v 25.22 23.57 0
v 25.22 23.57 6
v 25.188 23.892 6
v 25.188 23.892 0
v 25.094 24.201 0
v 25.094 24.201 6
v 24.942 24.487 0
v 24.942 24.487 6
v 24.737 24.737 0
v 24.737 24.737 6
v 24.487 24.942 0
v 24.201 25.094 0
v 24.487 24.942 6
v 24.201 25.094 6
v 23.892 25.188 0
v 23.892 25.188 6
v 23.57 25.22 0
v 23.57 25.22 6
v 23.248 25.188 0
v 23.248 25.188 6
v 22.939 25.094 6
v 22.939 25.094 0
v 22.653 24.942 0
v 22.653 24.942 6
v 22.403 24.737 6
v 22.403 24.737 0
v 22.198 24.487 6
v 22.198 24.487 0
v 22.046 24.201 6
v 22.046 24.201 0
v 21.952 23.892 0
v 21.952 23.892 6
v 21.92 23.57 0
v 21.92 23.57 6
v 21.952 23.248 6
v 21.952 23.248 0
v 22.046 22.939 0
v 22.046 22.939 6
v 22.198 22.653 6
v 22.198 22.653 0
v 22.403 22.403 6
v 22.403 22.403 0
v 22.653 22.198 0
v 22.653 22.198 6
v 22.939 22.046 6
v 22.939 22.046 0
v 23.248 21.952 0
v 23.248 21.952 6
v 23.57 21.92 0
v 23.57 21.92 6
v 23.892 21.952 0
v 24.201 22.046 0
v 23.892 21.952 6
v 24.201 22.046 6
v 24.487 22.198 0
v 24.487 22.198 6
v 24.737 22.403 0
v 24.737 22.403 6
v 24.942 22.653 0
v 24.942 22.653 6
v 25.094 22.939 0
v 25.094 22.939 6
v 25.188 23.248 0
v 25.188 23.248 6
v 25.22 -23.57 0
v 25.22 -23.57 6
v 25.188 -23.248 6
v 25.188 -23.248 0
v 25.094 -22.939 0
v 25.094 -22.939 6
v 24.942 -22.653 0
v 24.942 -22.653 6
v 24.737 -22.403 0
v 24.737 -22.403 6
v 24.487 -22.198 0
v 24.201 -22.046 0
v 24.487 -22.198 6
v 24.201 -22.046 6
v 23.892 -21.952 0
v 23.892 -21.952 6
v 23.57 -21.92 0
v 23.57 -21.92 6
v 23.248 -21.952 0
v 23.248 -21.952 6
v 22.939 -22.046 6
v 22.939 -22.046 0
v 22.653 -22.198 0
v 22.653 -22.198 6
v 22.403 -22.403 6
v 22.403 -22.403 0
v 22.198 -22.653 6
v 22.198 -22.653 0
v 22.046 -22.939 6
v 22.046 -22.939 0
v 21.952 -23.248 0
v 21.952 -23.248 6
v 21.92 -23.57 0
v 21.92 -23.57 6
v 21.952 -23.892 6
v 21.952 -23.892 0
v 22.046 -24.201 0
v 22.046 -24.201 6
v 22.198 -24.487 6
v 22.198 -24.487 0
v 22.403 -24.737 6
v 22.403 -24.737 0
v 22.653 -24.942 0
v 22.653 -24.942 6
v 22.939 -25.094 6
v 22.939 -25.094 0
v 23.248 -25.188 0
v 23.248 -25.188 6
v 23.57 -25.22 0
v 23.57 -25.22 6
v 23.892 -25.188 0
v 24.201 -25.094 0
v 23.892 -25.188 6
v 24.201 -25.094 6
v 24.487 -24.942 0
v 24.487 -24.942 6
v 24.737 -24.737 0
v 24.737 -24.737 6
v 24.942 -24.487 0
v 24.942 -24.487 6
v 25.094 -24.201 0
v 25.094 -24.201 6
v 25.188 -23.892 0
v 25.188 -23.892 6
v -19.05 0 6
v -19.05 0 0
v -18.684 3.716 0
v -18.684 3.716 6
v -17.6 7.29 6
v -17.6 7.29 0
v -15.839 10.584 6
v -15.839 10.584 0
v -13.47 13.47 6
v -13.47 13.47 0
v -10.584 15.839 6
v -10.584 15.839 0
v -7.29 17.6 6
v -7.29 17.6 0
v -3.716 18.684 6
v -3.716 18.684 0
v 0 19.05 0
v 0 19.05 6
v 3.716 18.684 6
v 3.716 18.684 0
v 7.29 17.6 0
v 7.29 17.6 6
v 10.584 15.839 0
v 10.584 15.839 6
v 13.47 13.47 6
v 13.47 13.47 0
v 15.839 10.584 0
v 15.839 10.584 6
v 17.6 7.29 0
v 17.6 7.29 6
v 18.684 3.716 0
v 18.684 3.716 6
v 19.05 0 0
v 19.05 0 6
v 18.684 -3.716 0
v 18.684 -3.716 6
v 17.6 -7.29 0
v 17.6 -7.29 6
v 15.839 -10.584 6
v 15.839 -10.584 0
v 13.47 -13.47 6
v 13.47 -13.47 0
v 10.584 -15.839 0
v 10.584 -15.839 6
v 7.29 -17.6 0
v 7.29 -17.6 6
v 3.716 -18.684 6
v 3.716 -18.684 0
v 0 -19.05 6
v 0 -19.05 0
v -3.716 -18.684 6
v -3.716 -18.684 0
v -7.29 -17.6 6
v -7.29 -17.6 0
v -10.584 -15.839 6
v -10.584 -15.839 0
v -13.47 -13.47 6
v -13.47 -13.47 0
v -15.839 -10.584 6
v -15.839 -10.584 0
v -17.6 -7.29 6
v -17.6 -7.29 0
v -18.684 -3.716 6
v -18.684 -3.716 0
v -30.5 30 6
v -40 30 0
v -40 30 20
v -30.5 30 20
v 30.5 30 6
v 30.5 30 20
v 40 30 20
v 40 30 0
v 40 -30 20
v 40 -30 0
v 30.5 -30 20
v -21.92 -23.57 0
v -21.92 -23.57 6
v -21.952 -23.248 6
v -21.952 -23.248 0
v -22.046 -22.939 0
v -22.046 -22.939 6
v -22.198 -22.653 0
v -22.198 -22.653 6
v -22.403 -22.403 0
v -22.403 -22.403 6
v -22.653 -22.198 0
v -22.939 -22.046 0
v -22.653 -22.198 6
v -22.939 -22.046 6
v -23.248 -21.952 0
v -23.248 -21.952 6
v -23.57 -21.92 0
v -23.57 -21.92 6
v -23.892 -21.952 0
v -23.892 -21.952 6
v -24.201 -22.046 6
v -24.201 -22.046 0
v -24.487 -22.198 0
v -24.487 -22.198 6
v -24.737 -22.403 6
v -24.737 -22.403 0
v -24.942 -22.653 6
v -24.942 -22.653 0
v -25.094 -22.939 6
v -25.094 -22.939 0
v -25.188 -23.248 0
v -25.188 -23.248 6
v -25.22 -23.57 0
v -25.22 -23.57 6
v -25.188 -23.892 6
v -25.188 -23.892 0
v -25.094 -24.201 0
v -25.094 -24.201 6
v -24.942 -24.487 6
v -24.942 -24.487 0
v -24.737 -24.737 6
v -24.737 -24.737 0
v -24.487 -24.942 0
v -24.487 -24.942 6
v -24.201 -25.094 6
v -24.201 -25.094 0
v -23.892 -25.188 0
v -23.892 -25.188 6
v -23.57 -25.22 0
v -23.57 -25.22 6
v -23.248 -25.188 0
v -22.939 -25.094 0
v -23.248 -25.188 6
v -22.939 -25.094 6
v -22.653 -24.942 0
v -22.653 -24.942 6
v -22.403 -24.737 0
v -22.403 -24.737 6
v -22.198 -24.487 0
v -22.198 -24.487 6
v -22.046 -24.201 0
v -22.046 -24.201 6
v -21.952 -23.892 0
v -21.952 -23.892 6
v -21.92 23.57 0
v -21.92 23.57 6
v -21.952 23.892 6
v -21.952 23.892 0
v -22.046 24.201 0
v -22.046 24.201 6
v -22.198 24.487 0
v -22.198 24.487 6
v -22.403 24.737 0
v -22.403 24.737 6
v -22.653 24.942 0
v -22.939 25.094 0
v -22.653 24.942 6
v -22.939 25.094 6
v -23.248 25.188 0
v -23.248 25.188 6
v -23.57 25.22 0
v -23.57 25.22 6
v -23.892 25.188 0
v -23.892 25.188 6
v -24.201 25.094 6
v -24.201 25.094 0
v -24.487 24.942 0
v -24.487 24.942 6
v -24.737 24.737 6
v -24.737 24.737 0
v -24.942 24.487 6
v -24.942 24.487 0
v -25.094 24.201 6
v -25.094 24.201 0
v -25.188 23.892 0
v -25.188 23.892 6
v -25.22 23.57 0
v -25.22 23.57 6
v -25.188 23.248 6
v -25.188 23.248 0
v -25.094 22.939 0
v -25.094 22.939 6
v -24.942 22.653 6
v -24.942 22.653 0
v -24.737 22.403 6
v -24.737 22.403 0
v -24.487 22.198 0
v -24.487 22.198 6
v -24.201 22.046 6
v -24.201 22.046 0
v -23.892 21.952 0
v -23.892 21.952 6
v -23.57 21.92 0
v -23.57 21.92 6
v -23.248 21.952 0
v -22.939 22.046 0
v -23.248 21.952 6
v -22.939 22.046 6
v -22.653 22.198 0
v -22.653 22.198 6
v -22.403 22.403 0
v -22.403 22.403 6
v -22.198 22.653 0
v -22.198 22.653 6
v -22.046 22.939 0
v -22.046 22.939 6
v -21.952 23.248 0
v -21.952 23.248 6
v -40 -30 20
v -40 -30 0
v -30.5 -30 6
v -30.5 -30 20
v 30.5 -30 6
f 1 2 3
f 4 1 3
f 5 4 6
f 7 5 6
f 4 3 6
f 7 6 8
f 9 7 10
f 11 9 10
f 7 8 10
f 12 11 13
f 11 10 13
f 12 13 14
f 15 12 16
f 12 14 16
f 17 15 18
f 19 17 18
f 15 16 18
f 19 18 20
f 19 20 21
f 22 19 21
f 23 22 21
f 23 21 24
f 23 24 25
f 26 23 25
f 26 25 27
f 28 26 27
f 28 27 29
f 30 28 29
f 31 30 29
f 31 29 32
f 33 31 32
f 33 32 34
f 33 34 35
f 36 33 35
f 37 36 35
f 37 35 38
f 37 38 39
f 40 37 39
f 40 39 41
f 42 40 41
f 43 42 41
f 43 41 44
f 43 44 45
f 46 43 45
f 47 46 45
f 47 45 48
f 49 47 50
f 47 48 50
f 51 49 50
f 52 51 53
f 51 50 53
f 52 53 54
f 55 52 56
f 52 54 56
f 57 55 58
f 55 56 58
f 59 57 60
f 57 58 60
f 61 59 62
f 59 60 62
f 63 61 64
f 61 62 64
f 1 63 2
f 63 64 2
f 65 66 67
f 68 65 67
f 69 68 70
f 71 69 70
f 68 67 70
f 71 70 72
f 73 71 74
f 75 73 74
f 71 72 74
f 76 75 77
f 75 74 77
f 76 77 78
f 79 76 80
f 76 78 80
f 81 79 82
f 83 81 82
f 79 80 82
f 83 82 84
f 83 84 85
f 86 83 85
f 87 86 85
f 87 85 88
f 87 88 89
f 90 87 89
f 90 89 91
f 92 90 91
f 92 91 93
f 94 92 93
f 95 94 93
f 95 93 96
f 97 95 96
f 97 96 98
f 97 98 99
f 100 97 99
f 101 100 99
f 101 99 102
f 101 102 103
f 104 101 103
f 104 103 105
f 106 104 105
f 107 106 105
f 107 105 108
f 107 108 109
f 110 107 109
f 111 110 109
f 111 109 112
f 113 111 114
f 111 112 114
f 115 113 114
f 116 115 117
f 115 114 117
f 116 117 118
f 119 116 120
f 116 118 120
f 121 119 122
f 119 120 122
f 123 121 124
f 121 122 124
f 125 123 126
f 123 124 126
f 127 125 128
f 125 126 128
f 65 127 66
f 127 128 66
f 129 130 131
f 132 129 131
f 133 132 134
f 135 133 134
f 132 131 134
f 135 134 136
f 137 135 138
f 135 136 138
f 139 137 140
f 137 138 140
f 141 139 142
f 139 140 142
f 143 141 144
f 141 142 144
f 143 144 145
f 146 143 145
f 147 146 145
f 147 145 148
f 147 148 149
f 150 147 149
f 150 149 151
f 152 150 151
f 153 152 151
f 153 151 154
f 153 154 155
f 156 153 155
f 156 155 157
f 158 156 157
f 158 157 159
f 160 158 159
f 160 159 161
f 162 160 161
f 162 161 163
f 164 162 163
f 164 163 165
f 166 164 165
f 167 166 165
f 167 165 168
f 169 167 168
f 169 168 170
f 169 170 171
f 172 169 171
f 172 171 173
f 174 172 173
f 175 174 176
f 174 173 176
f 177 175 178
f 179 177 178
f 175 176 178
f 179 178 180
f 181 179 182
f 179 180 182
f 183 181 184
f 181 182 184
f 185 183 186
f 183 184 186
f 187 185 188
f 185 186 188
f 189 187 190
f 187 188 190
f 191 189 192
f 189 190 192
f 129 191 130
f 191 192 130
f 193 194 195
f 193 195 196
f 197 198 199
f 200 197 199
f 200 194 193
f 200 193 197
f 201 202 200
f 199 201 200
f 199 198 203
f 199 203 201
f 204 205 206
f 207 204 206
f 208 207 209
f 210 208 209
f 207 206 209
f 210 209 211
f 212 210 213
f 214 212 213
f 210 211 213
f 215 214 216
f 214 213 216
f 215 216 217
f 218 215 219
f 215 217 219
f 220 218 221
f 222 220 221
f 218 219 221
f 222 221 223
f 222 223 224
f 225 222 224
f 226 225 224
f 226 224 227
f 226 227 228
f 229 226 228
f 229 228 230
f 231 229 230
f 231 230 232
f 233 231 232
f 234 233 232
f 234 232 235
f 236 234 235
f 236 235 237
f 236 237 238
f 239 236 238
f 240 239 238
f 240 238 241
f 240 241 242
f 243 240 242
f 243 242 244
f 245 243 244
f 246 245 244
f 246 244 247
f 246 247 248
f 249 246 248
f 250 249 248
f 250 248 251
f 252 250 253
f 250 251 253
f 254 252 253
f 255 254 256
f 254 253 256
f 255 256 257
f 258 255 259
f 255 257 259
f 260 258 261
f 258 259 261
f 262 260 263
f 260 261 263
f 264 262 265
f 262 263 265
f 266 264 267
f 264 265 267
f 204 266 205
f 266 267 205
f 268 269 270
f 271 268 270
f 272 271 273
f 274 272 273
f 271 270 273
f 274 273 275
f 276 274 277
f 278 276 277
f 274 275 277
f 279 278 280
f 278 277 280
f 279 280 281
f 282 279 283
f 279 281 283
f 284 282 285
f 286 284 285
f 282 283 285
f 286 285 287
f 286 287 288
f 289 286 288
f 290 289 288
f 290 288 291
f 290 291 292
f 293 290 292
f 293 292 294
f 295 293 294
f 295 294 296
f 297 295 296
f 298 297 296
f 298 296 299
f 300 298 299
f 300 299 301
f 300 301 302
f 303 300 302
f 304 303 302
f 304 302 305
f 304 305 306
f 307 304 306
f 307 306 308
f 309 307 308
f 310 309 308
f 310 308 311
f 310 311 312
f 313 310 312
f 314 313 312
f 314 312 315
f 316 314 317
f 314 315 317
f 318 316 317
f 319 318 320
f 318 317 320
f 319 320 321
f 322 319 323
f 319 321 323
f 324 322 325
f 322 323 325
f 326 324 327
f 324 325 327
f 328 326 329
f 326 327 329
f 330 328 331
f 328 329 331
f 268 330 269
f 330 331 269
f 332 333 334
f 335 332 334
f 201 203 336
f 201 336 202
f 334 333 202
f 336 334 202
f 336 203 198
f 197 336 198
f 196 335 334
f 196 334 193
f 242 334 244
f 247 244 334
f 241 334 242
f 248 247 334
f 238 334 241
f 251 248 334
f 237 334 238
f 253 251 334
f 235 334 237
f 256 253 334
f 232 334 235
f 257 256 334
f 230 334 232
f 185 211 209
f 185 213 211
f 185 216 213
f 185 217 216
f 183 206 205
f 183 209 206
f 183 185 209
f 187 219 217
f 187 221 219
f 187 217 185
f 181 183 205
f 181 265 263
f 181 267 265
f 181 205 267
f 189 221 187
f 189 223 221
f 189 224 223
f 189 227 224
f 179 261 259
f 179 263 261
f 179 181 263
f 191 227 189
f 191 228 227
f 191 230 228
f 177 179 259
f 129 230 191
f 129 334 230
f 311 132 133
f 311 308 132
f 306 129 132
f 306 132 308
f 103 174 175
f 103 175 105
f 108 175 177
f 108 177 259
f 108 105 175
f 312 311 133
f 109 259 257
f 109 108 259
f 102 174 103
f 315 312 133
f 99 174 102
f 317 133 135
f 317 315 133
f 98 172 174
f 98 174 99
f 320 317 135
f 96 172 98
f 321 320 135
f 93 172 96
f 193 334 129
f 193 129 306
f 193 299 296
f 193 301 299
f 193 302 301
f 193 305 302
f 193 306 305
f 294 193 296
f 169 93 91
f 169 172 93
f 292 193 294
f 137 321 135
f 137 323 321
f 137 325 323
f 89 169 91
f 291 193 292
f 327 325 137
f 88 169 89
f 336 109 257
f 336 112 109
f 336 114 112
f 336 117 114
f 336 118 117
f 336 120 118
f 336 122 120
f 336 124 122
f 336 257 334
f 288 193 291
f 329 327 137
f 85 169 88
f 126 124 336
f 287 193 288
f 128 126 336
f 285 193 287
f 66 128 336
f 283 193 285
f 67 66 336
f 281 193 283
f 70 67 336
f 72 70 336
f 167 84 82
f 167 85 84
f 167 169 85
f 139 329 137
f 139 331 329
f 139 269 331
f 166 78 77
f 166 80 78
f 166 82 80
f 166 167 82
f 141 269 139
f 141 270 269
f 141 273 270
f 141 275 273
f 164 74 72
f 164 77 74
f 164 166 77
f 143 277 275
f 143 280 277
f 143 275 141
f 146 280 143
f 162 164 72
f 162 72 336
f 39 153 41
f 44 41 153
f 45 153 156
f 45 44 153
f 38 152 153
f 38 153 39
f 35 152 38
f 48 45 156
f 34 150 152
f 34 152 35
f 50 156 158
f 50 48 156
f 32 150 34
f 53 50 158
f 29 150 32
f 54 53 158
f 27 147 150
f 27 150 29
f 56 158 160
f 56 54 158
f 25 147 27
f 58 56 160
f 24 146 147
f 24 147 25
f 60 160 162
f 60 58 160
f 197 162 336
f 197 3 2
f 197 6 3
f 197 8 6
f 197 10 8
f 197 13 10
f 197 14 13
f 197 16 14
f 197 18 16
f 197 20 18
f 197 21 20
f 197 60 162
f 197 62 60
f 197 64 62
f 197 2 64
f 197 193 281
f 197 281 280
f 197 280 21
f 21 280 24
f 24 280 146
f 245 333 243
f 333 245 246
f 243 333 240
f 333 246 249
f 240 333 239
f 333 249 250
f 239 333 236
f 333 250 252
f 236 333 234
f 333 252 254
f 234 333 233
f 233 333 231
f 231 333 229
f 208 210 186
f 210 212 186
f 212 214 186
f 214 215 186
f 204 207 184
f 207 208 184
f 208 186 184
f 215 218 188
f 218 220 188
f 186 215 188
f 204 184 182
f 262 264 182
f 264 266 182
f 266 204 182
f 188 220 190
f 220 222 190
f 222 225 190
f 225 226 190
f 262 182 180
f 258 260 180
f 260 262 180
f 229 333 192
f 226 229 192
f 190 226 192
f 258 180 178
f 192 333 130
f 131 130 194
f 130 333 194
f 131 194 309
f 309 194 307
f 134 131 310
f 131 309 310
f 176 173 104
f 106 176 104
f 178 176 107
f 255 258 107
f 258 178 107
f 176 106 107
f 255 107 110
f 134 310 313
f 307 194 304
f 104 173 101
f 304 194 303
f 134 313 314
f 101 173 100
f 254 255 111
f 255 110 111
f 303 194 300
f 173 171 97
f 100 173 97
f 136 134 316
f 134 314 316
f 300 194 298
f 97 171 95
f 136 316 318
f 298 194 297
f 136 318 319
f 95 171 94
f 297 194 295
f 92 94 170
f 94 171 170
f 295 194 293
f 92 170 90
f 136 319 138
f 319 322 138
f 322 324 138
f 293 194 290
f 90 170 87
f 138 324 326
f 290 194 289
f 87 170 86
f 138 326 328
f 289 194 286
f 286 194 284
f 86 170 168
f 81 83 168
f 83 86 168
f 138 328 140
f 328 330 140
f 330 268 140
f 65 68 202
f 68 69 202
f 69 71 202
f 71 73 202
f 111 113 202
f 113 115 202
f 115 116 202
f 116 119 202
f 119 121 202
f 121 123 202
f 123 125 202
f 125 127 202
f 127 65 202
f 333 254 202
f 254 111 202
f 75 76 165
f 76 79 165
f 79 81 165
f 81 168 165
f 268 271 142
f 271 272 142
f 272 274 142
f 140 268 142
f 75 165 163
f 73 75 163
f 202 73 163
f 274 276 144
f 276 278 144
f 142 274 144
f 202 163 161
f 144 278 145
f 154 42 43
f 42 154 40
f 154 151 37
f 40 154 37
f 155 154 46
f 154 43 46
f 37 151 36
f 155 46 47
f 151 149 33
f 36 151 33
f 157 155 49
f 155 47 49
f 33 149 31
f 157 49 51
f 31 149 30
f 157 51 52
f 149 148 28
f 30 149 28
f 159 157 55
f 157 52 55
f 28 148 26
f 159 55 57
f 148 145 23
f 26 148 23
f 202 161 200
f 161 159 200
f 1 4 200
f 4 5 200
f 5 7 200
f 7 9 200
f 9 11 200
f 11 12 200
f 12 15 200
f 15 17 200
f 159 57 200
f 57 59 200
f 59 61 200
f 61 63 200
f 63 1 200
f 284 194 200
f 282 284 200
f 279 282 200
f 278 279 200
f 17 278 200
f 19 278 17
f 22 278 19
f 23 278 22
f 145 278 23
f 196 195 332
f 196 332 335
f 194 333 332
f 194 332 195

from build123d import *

# Parameters (mm, degrees)
SKETCH_1_W          = 80
SKETCH_1_H          = 60
EXTRUDE_1_DEPTH     = 20
SKETCH_2_W          = 61
SKETCH_2_H          = 60
CUT_EXTRUDE_1_DEPTH = 14
SKETCH_3_R          = 19.05
CUT_EXTRUDE_2_DEPTH = 54.851648071
M4X0_7_1_D          = 3.3


with BuildPart() as part:
    # 草圖1 → 填料-伸長1 (new body)
    with BuildSketch(Plane.XY):
        Rectangle(SKETCH_1_W, SKETCH_1_H)
    extrude(amount=EXTRUDE_1_DEPTH)

    # 草圖2 → 除料-伸長1 (cut)
    with BuildSketch(Plane.XY.offset(20)):
        Rectangle(SKETCH_2_W, SKETCH_2_H)
    extrude(amount=-CUT_EXTRUDE_1_DEPTH, mode=Mode.SUBTRACT)

    # 草圖3 → 除料-伸長2 (cut, through all)
    with BuildSketch(Plane(origin=(0, 0, 0), x_dir=(-1, 0, 0), z_dir=(0, 0, -1))):
        Circle(SKETCH_3_R)
    extrude(amount=-CUT_EXTRUDE_2_DEPTH, mode=Mode.SUBTRACT)

    # M4x0.7 螺紋孔1 (through all)
    with Locations(Plane(origin=(0, 0, 0), x_dir=(-1, 0, 0), z_dir=(0, 0, -1))):
        with Locations((23.57, 23.57), (-23.57, -23.57), (-23.57, 23.57), (23.57, -23.57)):
            Hole(M4X0_7_1_D / 2)


solid = part.part
